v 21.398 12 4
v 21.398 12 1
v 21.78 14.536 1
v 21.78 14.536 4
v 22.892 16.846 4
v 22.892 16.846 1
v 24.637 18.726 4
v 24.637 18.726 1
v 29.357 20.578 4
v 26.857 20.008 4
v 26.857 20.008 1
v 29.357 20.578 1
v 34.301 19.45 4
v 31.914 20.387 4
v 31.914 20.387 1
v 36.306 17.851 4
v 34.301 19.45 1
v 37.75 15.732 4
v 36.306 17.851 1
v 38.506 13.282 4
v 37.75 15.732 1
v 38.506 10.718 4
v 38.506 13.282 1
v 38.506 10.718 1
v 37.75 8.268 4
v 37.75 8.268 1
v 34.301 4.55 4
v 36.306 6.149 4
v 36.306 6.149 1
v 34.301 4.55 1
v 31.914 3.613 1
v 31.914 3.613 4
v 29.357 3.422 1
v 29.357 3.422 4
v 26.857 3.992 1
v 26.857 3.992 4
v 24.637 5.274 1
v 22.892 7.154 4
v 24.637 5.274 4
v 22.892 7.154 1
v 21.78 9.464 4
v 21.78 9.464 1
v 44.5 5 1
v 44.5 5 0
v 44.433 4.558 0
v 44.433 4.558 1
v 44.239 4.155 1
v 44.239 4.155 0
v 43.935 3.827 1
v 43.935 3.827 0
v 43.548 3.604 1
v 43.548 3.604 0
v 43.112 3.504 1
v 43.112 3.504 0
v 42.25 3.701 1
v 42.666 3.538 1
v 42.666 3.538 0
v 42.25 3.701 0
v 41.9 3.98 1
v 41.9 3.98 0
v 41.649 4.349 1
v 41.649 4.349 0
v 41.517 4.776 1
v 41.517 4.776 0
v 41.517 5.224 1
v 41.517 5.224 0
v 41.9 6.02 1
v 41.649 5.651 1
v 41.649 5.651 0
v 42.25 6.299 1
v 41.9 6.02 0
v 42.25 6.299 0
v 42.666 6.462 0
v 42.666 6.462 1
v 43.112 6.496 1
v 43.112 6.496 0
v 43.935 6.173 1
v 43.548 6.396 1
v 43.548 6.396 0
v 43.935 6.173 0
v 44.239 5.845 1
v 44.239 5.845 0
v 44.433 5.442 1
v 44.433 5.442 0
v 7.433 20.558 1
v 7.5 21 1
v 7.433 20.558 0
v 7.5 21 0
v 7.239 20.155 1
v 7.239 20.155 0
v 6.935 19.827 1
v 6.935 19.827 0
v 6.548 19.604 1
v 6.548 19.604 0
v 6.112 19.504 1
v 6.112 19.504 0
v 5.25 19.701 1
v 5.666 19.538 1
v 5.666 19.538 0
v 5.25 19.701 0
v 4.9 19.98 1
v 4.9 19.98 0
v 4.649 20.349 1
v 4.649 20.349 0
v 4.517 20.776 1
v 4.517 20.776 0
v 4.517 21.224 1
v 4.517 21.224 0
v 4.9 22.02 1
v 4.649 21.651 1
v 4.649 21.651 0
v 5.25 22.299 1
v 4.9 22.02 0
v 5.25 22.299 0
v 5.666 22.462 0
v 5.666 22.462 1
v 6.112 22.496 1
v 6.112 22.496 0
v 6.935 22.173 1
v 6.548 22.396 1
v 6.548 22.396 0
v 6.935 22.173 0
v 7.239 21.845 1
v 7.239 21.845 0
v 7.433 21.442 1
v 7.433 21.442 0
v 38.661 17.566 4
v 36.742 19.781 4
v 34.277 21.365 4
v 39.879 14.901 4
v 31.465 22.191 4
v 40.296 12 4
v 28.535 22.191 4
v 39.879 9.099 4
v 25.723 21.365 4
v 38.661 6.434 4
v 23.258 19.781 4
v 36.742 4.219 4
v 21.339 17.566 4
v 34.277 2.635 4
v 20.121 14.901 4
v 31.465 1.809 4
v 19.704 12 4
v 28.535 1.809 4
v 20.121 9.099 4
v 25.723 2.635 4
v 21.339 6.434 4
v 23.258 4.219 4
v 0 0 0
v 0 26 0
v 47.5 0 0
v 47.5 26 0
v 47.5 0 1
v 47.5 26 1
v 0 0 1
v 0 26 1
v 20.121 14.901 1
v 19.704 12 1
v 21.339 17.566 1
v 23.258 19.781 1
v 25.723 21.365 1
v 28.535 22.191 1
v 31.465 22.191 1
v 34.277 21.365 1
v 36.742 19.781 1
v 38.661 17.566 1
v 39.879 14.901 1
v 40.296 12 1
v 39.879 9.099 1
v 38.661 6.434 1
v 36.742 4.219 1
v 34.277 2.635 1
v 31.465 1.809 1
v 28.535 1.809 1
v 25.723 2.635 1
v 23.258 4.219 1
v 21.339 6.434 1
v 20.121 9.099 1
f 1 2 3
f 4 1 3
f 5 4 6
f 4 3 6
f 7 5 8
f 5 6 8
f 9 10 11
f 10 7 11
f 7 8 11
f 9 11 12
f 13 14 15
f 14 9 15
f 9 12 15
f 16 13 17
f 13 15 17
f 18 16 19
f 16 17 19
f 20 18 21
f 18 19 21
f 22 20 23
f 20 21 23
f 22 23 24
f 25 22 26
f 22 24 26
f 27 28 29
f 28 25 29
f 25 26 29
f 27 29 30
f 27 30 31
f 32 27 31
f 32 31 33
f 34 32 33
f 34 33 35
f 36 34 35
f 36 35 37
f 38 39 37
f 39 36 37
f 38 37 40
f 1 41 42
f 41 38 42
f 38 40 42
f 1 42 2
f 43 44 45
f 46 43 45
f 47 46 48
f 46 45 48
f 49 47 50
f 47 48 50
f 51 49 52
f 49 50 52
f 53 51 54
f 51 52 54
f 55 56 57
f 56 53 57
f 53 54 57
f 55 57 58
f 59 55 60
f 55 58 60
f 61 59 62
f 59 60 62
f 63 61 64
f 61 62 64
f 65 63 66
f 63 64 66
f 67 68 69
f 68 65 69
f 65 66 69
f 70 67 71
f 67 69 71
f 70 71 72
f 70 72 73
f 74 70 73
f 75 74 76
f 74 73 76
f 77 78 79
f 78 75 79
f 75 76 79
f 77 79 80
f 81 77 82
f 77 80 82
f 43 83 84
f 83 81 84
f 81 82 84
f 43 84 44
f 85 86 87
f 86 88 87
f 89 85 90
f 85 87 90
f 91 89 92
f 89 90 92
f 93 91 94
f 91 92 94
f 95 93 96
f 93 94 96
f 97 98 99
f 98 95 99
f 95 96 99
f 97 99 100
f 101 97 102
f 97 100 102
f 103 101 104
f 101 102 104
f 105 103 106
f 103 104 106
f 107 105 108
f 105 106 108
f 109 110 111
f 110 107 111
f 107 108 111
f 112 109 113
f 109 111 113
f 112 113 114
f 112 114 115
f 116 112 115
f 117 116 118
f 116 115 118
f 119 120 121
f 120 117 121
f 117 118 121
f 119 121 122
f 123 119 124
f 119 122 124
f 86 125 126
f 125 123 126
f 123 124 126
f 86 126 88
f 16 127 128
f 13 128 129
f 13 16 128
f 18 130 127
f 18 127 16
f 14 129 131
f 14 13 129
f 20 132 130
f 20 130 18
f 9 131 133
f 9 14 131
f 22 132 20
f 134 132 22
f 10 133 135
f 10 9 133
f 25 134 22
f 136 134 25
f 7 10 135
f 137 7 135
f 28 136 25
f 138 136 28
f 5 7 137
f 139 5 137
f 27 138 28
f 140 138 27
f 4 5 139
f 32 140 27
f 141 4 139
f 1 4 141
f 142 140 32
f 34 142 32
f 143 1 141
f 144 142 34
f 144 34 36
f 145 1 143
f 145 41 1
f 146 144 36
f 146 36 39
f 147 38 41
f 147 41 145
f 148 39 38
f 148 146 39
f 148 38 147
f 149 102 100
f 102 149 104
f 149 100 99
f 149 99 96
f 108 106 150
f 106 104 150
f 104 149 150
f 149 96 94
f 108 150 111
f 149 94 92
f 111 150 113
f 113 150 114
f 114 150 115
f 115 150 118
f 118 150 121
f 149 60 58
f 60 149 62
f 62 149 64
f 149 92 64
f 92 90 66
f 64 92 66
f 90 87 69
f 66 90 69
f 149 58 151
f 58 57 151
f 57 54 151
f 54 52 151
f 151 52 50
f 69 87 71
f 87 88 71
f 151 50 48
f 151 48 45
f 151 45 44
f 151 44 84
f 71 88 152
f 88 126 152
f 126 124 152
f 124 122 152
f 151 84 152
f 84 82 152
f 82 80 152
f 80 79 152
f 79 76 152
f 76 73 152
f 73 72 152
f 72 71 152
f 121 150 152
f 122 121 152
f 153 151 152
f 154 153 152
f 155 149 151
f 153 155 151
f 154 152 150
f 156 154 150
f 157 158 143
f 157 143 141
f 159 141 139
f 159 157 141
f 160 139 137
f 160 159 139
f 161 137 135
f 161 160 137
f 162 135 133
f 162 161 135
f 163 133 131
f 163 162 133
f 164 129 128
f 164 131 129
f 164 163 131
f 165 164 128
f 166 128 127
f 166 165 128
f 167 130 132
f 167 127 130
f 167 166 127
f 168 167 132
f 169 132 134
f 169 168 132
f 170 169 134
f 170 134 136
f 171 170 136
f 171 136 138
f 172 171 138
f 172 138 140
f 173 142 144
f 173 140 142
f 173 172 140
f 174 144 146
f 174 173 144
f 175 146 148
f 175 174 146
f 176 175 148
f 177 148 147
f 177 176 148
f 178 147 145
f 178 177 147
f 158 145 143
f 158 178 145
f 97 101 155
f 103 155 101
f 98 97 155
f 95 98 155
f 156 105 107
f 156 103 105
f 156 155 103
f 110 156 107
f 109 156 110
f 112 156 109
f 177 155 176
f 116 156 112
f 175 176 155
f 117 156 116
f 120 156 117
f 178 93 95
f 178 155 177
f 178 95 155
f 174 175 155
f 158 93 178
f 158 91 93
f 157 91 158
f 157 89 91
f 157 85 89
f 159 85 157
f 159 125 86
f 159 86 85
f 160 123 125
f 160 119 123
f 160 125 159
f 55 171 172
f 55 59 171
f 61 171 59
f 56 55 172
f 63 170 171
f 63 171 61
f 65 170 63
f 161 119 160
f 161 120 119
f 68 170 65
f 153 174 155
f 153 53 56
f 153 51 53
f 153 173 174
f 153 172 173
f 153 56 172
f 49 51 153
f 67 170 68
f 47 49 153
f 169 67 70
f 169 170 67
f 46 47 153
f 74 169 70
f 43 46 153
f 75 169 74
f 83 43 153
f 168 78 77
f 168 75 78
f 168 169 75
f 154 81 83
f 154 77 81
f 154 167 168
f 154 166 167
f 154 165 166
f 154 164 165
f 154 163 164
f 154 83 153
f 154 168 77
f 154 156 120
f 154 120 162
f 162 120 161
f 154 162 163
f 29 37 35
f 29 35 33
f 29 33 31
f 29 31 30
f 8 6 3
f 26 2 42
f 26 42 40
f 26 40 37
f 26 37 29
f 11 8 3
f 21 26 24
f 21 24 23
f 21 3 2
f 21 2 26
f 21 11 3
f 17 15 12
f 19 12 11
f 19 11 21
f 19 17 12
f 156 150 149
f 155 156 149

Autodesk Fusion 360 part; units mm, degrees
sketch "Sketch1" plane through (0, 0, 0) normal (0, 0, 1) x (1, 0, 0)
  line L0 (0, 0) -> (47.5, 0)
  line L1 (47.5, 0) -> (47.5, 26)
  line L2 (47.5, 26) -> (0, 26)
  line L3 (0, 26) -> (0, 0)
  circle A0 centre (6, 21) radius 1.5
  circle A1 centre (43, 5) radius 1.5
  dimension "d1" = 47.5
  dimension "d2" = 26
  dimension "d3" = 3
  dimension "d4" = 3
  dimension "d5" = 5
  dimension "d6" = 6
  dimension "d7" = 4.5
  dimension "d8" = 5
  dimension "d103" = 0
  dimension "d104" = 0
  dimension "d105" = 0
  dimension "d106" = 0
  dimension "d127" = 0
  dimension "d128" = 0
  dimension "d129" = 0
  dimension "d130" = 0
extrude "Extrude1" add sketch "Sketch1" along normal blind 1
sketch "Sketch2" plane through (0, 0, 1) normal (0, 0, 1) x (-1, 0, 0)
  circle A0 centre (-43, -5) radius 1.5
  circle A1 centre (-6, -21) radius 1.5
  line L0 (0, -26) -> (0, 0)
  line L1 (0, 0) -> (-47.5, 0)
  line L2 (-47.5, 0) -> (-47.5, -26)
  line L3 (-47.5, -26) -> (0, -26)
  circle A2 centre (-30, -12) radius 10.2956
  circle A3 centre (-30, -12) radius 8.6023
  dimension "d13" = 30
extrude "Extrude2" add sketch "Sketch2" along normal blind 3 contours A2
